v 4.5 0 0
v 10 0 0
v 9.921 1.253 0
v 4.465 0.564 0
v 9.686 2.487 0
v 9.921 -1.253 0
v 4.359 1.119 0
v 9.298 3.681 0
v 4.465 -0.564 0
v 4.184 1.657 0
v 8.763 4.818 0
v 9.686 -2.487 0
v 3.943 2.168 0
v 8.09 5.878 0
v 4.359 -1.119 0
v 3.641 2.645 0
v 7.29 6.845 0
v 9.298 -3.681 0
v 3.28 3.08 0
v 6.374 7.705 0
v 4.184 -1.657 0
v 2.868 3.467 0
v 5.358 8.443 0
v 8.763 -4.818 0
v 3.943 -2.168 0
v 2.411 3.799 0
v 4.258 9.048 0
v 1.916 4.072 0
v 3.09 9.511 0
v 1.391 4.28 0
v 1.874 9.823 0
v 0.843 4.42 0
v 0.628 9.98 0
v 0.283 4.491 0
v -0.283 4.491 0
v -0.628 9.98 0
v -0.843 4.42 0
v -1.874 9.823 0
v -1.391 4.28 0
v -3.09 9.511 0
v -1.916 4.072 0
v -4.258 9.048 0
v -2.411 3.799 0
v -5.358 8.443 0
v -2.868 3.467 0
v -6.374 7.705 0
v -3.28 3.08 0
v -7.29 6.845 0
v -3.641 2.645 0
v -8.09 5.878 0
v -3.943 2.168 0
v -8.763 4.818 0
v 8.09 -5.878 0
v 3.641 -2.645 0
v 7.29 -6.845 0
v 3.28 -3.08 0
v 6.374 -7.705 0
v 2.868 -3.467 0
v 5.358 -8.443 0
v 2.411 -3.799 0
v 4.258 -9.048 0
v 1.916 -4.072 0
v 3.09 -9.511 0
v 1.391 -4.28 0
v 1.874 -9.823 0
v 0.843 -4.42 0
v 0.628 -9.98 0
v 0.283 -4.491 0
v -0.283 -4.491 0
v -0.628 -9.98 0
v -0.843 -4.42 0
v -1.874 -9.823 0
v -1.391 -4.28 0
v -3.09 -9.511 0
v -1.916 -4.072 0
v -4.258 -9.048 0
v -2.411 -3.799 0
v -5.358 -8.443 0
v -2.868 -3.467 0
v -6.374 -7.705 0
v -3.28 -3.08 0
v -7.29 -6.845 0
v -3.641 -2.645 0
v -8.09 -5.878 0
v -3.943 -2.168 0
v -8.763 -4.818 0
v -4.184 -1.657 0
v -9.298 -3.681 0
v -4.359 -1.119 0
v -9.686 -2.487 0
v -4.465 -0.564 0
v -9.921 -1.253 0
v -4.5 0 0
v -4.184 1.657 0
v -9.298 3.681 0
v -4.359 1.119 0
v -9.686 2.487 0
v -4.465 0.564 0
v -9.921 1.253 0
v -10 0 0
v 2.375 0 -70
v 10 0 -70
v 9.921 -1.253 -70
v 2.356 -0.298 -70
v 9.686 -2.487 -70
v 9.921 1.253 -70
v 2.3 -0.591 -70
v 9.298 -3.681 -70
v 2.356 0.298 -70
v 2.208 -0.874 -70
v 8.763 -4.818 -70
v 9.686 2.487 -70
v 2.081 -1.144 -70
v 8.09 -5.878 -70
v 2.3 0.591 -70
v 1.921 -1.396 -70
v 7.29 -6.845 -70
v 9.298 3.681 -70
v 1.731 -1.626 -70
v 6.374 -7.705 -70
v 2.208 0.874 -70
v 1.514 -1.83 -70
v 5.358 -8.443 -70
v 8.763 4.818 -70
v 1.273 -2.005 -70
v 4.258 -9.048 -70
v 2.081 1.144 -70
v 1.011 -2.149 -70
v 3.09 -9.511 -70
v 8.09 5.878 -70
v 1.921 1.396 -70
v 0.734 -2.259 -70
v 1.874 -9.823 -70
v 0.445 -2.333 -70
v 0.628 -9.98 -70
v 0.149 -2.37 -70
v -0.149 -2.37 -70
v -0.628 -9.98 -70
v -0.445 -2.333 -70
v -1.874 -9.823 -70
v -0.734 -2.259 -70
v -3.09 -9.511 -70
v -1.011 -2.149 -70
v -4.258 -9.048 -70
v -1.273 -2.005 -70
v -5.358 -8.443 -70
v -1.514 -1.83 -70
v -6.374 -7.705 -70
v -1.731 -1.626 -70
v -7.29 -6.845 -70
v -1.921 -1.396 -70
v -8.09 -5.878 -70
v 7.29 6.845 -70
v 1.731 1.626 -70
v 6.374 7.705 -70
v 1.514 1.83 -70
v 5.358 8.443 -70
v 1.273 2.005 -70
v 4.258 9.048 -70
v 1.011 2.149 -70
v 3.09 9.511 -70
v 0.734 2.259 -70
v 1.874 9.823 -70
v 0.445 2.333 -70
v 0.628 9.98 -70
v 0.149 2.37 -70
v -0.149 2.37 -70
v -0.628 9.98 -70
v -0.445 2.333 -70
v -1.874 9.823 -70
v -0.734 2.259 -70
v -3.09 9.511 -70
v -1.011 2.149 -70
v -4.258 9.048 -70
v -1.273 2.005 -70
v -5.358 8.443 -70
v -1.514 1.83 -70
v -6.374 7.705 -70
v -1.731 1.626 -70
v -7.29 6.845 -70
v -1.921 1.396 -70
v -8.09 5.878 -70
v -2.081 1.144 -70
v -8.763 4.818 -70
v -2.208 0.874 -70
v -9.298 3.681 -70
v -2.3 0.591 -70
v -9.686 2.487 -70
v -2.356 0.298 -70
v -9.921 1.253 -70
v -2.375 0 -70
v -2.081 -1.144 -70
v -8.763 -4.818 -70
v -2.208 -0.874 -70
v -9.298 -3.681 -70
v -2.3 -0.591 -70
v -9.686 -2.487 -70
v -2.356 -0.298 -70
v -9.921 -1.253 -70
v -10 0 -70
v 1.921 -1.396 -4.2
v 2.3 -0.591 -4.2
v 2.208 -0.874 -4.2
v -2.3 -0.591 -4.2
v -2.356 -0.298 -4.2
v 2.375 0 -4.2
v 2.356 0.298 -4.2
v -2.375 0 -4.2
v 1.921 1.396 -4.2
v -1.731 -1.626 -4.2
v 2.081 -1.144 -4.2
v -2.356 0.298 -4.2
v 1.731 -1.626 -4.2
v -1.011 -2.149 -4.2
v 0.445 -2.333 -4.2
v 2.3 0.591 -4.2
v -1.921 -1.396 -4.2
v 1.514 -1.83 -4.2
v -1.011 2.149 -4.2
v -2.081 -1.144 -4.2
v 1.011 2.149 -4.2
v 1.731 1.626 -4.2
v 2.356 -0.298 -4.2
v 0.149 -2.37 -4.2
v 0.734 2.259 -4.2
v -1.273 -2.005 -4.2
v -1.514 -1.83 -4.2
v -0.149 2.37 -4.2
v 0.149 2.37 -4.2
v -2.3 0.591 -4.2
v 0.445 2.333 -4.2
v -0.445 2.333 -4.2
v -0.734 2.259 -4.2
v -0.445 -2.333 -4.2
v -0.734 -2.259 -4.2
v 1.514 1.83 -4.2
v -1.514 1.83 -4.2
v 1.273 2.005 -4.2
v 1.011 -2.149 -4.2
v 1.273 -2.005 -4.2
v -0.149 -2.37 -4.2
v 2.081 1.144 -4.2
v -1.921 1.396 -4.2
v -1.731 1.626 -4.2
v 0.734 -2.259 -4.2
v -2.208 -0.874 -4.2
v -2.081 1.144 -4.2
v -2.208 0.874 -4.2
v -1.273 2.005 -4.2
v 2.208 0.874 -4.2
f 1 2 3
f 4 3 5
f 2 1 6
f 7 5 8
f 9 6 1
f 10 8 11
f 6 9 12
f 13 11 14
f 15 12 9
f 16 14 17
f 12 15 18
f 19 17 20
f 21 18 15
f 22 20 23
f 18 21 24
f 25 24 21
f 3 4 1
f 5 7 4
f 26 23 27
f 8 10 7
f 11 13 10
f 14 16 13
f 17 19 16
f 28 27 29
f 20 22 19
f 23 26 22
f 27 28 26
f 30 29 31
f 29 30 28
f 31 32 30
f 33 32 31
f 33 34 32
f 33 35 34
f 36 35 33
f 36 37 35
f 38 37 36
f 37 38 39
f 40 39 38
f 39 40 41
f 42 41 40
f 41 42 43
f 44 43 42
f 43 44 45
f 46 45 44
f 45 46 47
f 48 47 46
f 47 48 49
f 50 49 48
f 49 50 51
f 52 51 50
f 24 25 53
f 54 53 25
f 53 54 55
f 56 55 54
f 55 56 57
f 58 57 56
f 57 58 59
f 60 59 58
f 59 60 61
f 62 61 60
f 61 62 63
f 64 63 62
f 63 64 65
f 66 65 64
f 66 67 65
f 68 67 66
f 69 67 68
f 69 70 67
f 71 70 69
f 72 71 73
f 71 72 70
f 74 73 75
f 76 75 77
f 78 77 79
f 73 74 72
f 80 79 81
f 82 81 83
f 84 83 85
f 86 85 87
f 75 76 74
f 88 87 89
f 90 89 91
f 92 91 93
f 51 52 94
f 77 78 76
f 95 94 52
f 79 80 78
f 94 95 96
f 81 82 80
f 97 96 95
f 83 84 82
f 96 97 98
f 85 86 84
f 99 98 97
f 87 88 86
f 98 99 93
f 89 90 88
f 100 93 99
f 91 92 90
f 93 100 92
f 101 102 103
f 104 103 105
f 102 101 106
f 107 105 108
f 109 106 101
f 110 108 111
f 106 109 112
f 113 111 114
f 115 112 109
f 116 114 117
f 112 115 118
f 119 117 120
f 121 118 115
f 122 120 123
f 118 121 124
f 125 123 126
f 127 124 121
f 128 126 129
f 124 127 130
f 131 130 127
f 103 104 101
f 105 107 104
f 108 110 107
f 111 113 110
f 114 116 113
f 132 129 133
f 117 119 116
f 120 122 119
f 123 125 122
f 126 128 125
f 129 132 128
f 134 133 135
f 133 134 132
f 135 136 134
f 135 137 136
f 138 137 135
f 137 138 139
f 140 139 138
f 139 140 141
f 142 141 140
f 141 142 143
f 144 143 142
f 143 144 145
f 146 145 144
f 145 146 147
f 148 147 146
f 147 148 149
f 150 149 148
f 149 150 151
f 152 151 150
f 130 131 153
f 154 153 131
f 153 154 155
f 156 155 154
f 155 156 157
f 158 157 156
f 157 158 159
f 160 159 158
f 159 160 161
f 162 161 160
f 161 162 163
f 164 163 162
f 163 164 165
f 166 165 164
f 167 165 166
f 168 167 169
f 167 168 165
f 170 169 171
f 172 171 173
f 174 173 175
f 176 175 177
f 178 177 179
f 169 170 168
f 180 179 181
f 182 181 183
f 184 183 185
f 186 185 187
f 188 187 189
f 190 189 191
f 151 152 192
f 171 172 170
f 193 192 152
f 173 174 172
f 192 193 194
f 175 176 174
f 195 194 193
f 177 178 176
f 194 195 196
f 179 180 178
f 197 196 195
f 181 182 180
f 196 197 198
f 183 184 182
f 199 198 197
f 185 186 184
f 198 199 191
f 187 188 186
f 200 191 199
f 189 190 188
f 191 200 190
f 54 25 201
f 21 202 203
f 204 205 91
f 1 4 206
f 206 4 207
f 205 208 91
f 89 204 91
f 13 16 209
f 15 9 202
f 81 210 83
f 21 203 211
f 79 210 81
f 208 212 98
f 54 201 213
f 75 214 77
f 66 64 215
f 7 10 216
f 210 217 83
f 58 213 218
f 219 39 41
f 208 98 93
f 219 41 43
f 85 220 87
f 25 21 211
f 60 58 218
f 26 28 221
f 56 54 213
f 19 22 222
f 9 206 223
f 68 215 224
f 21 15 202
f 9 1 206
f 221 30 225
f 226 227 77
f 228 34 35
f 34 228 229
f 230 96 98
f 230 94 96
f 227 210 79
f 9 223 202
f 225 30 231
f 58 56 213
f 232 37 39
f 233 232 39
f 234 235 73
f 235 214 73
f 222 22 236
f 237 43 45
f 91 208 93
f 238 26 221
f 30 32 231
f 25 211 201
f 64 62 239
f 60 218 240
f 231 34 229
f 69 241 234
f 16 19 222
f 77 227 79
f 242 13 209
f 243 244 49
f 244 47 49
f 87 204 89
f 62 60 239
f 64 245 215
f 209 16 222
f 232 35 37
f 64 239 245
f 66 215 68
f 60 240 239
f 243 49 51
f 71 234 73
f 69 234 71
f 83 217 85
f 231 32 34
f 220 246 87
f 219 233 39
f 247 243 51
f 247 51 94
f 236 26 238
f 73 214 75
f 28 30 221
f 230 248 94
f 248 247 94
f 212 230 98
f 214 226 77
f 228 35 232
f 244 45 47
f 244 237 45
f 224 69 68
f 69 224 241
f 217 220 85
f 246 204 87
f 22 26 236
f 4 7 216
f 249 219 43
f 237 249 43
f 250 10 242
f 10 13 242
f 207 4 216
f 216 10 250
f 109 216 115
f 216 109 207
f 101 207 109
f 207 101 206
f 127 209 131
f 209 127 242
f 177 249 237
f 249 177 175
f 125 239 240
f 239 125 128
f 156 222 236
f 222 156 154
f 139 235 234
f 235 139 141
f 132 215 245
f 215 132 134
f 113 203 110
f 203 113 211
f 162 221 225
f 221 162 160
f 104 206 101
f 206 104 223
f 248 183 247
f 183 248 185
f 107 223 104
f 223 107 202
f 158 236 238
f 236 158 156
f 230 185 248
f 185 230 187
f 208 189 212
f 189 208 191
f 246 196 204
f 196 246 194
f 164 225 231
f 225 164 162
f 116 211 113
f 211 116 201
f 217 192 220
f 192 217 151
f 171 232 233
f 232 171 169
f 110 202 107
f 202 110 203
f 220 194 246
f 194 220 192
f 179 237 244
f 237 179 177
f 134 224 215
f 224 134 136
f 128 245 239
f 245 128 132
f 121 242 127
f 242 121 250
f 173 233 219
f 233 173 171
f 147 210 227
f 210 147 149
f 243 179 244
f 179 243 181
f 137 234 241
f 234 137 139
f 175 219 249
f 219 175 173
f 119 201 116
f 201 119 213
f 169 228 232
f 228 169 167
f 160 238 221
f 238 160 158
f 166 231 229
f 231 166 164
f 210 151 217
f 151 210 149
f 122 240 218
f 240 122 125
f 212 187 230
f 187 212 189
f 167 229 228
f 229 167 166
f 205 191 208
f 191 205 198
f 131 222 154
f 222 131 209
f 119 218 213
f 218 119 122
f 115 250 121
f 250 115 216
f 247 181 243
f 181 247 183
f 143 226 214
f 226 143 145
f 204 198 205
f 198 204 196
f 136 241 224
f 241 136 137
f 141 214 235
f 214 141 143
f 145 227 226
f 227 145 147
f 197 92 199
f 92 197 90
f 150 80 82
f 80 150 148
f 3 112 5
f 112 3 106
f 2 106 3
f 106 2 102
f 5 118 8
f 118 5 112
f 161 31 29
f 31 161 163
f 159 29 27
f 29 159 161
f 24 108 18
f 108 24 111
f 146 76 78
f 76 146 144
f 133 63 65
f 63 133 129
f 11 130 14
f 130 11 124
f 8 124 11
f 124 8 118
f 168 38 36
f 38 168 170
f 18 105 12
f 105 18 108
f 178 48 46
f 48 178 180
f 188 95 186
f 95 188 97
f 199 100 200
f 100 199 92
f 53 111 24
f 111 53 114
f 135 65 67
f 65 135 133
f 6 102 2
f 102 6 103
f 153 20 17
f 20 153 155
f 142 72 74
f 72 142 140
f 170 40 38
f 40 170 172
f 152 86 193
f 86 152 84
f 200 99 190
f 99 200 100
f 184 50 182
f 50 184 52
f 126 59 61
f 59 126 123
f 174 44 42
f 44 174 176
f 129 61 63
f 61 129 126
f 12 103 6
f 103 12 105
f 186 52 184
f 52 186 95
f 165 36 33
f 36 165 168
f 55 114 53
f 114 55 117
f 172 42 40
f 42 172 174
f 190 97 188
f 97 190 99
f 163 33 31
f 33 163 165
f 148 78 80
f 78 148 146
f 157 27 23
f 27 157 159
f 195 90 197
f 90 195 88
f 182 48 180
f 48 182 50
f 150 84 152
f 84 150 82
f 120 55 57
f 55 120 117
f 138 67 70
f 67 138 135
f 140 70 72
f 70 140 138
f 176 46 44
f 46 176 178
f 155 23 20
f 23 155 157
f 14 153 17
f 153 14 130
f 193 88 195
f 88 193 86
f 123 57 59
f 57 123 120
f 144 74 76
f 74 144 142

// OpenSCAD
$fn = 50;


difference() {
	union() {
		translate(v = [0, 0, -70.0000000000]) {
			cylinder(h = 70, r = 10.0000000000);
		}
		cylinder(h = 0, r = 13.0000000000);
	}
	union() {
		translate(v = [0, 0, 0]) {
			rotate(a = [0, 0, 0]) {
				difference() {
					union() {
						#translate(v = [0, 0, -70.0000000000]) {
							cylinder(h = 70, r = 2.2500000000);
						}
						#translate(v = [0, 0, -4.2000000000]) {
							cylinder(h = 4.2000000000, r1 = 2.3750000000, r2 = 4.5000000000);
						}
						#translate(v = [0, 0, -70.0000000000]) {
							cylinder(h = 70, r = 2.3750000000);
						}
						#translate(v = [0, 0, -70.0000000000]) {
							cylinder(h = 70, r = 2.2500000000);
						}
					}
					union();
				}
			}
		}
	}
}
